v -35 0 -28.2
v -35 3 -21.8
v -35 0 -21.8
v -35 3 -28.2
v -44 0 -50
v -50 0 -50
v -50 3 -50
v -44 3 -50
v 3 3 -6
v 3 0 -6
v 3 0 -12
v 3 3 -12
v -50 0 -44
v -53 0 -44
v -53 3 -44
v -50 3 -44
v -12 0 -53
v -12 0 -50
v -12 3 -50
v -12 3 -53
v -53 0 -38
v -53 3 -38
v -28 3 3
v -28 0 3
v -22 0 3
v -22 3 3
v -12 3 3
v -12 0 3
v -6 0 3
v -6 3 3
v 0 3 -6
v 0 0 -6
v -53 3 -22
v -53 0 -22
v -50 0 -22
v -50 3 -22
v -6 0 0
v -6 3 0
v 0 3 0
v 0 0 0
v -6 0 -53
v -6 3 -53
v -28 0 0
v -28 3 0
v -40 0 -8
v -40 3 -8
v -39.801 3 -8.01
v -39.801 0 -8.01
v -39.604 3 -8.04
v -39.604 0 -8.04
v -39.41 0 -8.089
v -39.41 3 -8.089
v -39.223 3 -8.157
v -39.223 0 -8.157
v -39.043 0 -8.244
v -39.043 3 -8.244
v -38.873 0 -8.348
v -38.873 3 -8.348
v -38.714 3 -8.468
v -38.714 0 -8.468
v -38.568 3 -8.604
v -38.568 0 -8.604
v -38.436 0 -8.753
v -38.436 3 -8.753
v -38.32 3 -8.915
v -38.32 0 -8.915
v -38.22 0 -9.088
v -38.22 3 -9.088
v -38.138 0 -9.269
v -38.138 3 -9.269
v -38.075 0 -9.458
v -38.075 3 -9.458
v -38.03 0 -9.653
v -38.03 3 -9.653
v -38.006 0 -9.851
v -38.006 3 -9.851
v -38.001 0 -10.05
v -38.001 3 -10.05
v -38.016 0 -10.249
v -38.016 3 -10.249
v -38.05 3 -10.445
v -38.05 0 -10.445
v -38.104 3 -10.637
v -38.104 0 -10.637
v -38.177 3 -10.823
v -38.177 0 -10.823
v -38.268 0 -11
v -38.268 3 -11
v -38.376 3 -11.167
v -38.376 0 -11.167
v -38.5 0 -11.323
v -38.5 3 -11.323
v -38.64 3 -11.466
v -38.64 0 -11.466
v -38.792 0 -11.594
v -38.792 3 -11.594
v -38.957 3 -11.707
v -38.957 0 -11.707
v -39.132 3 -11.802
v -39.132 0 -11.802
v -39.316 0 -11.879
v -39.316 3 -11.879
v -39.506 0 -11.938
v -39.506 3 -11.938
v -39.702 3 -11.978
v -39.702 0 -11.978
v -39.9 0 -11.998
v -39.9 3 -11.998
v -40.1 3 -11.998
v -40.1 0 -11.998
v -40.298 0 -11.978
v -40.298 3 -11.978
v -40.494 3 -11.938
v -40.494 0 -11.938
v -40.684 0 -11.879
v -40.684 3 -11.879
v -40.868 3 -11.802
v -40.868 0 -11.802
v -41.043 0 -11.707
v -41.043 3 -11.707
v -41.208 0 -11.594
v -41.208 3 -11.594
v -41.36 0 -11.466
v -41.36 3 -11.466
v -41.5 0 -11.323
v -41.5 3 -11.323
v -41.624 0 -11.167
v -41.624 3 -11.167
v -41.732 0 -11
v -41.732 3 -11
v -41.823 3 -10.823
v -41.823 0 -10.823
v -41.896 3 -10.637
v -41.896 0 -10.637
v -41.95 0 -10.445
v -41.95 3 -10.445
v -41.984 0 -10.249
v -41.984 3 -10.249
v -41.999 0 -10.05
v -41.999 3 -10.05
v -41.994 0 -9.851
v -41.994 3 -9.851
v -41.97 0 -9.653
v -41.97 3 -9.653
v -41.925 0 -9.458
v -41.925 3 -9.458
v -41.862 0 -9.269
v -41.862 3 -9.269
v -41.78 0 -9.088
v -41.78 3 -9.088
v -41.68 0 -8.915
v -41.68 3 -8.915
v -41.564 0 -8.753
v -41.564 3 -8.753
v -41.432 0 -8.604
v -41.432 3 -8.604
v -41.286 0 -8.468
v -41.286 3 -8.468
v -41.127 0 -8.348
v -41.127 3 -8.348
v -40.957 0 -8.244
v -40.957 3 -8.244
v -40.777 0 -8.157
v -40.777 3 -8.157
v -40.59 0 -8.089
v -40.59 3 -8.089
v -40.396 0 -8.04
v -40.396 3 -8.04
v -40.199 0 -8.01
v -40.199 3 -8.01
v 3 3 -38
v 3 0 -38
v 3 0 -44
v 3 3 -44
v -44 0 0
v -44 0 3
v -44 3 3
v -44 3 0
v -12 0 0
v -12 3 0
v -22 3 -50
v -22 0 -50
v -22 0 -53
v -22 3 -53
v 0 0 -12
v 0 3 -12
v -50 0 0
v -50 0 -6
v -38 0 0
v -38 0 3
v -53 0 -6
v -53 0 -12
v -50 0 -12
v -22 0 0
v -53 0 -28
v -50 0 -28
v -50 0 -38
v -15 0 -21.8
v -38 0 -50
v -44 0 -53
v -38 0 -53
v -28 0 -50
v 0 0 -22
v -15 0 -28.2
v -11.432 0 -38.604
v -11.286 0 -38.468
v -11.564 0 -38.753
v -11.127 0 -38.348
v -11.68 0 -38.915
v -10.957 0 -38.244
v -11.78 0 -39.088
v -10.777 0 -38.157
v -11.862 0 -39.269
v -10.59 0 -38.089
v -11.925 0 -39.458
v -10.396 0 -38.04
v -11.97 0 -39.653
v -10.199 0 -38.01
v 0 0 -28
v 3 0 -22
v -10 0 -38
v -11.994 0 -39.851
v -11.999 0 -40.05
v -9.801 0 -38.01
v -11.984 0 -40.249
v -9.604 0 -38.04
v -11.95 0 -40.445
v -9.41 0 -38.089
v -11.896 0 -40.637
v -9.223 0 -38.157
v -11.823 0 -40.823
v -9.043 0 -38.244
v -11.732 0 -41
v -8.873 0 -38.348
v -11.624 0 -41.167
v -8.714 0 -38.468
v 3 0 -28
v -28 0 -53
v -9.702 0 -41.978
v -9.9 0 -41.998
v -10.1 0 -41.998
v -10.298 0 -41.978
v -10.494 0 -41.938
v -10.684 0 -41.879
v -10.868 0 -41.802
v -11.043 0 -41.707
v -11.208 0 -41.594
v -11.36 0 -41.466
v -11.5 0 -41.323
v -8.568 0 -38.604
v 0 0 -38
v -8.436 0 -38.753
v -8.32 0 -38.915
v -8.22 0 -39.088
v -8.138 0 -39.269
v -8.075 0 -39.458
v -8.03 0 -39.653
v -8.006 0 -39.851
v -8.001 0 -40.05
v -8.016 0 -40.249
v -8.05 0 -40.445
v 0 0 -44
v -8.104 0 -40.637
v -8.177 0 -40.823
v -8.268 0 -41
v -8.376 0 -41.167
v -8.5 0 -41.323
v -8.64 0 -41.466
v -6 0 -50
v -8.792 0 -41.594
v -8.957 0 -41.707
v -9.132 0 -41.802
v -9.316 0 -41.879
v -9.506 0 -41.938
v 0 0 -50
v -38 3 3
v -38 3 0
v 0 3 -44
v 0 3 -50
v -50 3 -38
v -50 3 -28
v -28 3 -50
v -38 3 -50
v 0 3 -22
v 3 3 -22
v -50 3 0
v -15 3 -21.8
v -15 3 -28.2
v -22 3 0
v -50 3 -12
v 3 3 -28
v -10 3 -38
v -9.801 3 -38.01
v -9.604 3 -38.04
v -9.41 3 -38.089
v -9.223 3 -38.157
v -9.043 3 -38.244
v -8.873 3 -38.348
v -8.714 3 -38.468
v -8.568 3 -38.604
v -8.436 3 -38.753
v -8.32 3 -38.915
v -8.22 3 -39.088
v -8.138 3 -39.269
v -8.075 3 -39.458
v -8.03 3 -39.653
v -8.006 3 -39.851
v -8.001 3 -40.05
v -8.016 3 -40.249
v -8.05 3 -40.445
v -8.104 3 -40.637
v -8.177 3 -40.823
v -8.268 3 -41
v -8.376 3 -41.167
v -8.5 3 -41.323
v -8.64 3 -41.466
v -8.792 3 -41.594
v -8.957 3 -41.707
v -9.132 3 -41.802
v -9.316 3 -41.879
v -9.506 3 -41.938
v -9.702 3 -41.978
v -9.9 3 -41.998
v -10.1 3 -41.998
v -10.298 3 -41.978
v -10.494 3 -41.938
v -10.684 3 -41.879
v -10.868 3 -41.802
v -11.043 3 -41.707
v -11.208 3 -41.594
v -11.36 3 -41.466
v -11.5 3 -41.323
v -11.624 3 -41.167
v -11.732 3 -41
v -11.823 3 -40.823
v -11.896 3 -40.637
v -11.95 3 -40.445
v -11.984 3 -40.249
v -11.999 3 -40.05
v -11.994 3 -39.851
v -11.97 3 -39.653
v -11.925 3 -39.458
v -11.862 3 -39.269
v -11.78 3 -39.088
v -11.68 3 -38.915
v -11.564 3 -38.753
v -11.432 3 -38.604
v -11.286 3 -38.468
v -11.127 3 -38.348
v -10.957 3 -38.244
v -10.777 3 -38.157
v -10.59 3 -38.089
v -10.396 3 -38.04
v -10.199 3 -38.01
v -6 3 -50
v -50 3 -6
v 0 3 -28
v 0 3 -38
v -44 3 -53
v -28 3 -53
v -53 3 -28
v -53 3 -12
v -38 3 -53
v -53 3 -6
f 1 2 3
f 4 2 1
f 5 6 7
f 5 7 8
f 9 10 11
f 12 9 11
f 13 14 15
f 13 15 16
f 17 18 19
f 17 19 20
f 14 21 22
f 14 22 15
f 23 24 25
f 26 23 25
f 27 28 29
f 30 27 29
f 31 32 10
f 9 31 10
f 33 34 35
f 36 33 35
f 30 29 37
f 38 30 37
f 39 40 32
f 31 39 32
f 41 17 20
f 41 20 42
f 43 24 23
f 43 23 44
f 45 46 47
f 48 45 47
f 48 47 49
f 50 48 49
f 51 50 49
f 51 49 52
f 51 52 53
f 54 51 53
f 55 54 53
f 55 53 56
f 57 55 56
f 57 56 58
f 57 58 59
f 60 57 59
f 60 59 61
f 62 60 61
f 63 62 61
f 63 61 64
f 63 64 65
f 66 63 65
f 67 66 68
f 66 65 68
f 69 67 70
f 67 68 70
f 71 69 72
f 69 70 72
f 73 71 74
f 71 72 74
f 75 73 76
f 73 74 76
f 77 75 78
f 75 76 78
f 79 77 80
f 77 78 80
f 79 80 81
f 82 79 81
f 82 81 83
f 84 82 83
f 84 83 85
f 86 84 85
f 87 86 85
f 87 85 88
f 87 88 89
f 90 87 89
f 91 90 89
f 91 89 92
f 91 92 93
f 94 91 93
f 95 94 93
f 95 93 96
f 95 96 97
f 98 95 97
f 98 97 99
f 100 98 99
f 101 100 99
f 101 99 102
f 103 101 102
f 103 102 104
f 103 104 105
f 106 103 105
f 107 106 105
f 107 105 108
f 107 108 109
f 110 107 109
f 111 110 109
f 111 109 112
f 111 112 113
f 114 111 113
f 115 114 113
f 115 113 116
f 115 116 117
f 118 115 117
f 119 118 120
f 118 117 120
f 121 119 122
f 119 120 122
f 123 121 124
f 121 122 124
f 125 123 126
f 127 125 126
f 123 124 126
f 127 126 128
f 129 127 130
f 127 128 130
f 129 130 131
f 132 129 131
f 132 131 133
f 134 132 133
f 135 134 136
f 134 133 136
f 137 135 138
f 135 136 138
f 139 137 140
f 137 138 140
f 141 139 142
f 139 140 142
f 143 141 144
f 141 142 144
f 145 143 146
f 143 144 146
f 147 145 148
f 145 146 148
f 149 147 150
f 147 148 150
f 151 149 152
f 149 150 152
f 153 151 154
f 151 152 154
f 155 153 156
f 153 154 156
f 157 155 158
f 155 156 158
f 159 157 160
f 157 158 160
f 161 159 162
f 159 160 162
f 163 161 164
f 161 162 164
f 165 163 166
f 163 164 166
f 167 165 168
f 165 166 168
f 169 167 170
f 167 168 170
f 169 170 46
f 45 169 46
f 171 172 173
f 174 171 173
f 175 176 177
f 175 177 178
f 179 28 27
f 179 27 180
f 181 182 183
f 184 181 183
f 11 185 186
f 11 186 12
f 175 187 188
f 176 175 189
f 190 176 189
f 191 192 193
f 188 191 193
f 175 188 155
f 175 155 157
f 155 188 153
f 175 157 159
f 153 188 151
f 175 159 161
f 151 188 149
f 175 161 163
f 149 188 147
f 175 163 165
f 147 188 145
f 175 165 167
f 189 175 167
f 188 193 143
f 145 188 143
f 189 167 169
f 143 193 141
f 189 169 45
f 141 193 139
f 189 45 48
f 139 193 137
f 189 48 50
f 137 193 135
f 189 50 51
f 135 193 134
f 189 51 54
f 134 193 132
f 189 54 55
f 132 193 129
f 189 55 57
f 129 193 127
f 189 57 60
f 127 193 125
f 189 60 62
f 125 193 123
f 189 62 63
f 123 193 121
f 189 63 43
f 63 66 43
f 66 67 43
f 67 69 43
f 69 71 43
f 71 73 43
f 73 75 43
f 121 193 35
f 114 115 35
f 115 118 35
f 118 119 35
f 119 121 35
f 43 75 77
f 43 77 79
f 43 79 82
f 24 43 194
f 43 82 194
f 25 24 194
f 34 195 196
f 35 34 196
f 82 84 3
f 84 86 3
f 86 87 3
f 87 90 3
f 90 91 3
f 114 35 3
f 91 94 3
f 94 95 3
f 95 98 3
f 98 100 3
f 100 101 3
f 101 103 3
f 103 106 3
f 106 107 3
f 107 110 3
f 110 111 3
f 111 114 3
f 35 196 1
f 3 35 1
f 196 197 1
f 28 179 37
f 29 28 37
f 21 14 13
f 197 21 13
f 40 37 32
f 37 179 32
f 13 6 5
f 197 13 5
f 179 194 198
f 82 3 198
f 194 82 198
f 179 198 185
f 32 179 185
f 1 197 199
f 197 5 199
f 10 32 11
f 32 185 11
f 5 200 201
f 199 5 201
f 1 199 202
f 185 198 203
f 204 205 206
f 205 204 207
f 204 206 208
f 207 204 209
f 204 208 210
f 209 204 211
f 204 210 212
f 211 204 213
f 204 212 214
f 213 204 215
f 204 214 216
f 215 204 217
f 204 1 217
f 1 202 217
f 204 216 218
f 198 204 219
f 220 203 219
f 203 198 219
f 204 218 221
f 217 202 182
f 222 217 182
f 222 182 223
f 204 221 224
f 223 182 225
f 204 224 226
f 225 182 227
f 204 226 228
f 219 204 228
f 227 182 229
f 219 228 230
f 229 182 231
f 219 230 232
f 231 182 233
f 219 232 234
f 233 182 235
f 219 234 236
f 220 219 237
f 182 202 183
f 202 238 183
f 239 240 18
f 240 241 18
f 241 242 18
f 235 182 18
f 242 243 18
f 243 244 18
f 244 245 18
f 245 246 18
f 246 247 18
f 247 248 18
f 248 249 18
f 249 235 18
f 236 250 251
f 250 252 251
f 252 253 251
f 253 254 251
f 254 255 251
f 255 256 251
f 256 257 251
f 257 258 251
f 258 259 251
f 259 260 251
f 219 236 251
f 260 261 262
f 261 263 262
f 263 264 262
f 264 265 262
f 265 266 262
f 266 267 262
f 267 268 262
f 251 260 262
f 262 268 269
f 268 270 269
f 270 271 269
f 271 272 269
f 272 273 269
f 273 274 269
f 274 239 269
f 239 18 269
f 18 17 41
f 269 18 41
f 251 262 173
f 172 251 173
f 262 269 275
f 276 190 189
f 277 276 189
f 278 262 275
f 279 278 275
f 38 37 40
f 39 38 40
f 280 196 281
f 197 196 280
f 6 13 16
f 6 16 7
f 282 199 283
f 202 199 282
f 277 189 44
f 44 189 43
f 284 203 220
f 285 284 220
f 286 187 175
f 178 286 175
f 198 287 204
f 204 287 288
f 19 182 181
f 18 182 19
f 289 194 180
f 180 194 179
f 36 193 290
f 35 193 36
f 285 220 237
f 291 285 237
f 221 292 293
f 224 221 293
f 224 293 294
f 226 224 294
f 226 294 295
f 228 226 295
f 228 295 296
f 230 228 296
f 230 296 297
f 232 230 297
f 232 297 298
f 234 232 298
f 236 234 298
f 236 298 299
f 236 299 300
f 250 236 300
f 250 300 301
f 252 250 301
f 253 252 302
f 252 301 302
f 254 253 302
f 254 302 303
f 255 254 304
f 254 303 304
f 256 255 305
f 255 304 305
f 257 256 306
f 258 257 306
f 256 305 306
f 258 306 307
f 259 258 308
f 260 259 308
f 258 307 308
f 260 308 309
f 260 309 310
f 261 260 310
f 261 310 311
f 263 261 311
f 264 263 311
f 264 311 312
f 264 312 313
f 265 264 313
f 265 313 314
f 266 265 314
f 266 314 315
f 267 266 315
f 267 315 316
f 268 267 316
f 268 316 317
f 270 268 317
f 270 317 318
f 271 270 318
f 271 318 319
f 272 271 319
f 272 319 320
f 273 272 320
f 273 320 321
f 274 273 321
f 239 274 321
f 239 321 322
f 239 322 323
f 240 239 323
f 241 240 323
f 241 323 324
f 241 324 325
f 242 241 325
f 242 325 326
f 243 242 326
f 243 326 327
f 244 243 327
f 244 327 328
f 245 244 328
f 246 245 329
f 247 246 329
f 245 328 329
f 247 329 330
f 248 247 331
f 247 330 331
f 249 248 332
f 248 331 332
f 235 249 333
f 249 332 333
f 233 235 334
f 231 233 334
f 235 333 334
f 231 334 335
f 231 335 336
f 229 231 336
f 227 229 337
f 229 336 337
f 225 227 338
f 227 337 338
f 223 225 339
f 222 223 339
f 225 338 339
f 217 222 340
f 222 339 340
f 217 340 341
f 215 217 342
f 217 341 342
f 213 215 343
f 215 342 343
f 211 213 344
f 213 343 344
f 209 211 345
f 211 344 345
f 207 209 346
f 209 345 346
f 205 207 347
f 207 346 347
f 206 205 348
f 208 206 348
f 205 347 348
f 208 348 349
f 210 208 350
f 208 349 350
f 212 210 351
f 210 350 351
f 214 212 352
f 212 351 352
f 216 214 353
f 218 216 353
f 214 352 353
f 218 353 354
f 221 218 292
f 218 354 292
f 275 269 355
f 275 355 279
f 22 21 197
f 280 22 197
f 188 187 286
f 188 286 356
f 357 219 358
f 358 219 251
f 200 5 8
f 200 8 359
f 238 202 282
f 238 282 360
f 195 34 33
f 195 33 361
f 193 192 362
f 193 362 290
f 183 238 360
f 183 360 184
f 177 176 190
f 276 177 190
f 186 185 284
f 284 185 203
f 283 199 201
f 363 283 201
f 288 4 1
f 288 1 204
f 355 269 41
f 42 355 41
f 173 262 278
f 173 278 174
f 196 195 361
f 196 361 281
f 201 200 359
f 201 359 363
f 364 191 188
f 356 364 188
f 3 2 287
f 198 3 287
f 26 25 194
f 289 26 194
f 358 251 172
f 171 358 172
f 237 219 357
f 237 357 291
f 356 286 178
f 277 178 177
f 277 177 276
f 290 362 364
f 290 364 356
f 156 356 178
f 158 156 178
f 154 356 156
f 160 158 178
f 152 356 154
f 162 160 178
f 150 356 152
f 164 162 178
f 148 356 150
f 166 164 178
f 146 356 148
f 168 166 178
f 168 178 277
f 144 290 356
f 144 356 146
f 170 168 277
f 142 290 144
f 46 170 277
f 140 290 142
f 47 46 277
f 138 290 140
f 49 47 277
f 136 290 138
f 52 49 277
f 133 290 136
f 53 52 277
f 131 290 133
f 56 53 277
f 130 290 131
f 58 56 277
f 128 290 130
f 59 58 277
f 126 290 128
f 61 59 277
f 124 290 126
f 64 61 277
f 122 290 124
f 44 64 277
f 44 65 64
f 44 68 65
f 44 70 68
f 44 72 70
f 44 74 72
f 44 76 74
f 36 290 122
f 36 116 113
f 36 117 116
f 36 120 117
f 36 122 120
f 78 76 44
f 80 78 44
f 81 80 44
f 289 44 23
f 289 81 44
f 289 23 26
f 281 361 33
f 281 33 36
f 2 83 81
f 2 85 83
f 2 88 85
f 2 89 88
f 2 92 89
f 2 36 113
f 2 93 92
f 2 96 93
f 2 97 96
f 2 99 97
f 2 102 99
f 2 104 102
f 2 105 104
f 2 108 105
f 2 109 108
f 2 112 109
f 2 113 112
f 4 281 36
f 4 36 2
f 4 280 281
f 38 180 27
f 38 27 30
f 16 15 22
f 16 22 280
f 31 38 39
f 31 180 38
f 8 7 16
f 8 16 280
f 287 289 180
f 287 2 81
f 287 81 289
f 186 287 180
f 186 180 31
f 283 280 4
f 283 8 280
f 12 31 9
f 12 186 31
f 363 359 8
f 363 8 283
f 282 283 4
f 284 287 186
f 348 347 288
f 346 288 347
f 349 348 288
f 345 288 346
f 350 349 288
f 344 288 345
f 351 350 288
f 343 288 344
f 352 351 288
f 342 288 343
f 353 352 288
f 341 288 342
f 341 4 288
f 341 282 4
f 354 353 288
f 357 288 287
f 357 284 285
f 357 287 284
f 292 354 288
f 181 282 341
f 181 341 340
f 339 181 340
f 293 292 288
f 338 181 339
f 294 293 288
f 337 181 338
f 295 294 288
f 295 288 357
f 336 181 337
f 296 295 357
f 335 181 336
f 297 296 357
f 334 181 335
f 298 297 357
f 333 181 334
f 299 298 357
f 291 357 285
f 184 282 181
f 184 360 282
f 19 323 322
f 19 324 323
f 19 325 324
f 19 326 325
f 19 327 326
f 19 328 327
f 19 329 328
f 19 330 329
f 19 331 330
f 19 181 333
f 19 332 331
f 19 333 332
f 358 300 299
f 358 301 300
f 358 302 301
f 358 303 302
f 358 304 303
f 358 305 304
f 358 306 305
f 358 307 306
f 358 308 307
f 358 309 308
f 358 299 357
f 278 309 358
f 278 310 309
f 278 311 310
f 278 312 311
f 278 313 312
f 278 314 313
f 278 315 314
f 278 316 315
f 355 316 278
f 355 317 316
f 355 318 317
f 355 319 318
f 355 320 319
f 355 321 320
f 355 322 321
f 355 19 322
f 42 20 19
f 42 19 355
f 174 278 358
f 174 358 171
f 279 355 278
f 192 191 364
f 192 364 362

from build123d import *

# Parameters (mm, degrees)
SKETCH1_W           = 3
SKETCH1_H           = 6
SKETCH1_W_2         = 6
SKETCH1_H_2         = 3
SKETCH1_W_3         = 50
SKETCH1_H_3         = 50
BOSS_EXTRUDE1_DEPTH = 3
SKETCH2_R           = 2
SKETCH2_W           = 20
SKETCH2_H           = 6.4
CUT_EXTRUDE1_DEPTH  = 76.013332148


with BuildPart() as part:
    # Sketch1 → Boss-Extrude1 (new body)
    with BuildSketch(Plane(origin=(0, 0, 0), x_dir=(1, 0, 0), z_dir=(0, 1, 0))):
        with Locations((-51.5, 9)):
            Rectangle(SKETCH1_W, SKETCH1_H)
        with Locations((-51.5, 25)):
            Rectangle(SKETCH1_W, SKETCH1_H)
        with Locations((-51.5, 41)):
            Rectangle(SKETCH1_W, SKETCH1_H)
        with Locations((-41, 51.5)):
            Rectangle(SKETCH1_W_2, SKETCH1_H_2)
        with Locations((-25, 25)):
            Rectangle(SKETCH1_W_3, SKETCH1_H_3)
        with Locations((-25, 51.5)):
            Rectangle(SKETCH1_W_2, SKETCH1_H_2)
        with Locations((-9, 51.5)):
            Rectangle(SKETCH1_W_2, SKETCH1_H_2)
        with Locations((1.5, 41)):
            Rectangle(SKETCH1_W, SKETCH1_H)
        with Locations((1.5, 25)):
            Rectangle(SKETCH1_W, SKETCH1_H)
        with Locations((1.5, 9)):
            Rectangle(SKETCH1_W, SKETCH1_H)
        with Locations((-9, -1.5)):
            Rectangle(SKETCH1_W_2, SKETCH1_H_2)
        with Locations((-25, -1.5)):
            Rectangle(SKETCH1_W_2, SKETCH1_H_2)
        with Locations((-41, -1.5)):
            Rectangle(SKETCH1_W_2, SKETCH1_H_2)
    extrude(amount=BOSS_EXTRUDE1_DEPTH)

    # Sketch2 → Cut-Extrude1 (cut, through all)
    with BuildSketch(Plane(origin=(0, 3, 0), x_dir=(1, 0, 0), z_dir=(0, 1, 0))):
        with Locations(Location((-40, 10, 0), (0, 0, 270))):
            Circle(SKETCH2_R)
        with Locations(Location((-10, 40, 0), (0, 0, 270))):
            Circle(SKETCH2_R)
        with Locations((-25, 25)):
            Rectangle(SKETCH2_W, SKETCH2_H)
    extrude(amount=-CUT_EXTRUDE1_DEPTH, mode=Mode.SUBTRACT)


solid = part.part
